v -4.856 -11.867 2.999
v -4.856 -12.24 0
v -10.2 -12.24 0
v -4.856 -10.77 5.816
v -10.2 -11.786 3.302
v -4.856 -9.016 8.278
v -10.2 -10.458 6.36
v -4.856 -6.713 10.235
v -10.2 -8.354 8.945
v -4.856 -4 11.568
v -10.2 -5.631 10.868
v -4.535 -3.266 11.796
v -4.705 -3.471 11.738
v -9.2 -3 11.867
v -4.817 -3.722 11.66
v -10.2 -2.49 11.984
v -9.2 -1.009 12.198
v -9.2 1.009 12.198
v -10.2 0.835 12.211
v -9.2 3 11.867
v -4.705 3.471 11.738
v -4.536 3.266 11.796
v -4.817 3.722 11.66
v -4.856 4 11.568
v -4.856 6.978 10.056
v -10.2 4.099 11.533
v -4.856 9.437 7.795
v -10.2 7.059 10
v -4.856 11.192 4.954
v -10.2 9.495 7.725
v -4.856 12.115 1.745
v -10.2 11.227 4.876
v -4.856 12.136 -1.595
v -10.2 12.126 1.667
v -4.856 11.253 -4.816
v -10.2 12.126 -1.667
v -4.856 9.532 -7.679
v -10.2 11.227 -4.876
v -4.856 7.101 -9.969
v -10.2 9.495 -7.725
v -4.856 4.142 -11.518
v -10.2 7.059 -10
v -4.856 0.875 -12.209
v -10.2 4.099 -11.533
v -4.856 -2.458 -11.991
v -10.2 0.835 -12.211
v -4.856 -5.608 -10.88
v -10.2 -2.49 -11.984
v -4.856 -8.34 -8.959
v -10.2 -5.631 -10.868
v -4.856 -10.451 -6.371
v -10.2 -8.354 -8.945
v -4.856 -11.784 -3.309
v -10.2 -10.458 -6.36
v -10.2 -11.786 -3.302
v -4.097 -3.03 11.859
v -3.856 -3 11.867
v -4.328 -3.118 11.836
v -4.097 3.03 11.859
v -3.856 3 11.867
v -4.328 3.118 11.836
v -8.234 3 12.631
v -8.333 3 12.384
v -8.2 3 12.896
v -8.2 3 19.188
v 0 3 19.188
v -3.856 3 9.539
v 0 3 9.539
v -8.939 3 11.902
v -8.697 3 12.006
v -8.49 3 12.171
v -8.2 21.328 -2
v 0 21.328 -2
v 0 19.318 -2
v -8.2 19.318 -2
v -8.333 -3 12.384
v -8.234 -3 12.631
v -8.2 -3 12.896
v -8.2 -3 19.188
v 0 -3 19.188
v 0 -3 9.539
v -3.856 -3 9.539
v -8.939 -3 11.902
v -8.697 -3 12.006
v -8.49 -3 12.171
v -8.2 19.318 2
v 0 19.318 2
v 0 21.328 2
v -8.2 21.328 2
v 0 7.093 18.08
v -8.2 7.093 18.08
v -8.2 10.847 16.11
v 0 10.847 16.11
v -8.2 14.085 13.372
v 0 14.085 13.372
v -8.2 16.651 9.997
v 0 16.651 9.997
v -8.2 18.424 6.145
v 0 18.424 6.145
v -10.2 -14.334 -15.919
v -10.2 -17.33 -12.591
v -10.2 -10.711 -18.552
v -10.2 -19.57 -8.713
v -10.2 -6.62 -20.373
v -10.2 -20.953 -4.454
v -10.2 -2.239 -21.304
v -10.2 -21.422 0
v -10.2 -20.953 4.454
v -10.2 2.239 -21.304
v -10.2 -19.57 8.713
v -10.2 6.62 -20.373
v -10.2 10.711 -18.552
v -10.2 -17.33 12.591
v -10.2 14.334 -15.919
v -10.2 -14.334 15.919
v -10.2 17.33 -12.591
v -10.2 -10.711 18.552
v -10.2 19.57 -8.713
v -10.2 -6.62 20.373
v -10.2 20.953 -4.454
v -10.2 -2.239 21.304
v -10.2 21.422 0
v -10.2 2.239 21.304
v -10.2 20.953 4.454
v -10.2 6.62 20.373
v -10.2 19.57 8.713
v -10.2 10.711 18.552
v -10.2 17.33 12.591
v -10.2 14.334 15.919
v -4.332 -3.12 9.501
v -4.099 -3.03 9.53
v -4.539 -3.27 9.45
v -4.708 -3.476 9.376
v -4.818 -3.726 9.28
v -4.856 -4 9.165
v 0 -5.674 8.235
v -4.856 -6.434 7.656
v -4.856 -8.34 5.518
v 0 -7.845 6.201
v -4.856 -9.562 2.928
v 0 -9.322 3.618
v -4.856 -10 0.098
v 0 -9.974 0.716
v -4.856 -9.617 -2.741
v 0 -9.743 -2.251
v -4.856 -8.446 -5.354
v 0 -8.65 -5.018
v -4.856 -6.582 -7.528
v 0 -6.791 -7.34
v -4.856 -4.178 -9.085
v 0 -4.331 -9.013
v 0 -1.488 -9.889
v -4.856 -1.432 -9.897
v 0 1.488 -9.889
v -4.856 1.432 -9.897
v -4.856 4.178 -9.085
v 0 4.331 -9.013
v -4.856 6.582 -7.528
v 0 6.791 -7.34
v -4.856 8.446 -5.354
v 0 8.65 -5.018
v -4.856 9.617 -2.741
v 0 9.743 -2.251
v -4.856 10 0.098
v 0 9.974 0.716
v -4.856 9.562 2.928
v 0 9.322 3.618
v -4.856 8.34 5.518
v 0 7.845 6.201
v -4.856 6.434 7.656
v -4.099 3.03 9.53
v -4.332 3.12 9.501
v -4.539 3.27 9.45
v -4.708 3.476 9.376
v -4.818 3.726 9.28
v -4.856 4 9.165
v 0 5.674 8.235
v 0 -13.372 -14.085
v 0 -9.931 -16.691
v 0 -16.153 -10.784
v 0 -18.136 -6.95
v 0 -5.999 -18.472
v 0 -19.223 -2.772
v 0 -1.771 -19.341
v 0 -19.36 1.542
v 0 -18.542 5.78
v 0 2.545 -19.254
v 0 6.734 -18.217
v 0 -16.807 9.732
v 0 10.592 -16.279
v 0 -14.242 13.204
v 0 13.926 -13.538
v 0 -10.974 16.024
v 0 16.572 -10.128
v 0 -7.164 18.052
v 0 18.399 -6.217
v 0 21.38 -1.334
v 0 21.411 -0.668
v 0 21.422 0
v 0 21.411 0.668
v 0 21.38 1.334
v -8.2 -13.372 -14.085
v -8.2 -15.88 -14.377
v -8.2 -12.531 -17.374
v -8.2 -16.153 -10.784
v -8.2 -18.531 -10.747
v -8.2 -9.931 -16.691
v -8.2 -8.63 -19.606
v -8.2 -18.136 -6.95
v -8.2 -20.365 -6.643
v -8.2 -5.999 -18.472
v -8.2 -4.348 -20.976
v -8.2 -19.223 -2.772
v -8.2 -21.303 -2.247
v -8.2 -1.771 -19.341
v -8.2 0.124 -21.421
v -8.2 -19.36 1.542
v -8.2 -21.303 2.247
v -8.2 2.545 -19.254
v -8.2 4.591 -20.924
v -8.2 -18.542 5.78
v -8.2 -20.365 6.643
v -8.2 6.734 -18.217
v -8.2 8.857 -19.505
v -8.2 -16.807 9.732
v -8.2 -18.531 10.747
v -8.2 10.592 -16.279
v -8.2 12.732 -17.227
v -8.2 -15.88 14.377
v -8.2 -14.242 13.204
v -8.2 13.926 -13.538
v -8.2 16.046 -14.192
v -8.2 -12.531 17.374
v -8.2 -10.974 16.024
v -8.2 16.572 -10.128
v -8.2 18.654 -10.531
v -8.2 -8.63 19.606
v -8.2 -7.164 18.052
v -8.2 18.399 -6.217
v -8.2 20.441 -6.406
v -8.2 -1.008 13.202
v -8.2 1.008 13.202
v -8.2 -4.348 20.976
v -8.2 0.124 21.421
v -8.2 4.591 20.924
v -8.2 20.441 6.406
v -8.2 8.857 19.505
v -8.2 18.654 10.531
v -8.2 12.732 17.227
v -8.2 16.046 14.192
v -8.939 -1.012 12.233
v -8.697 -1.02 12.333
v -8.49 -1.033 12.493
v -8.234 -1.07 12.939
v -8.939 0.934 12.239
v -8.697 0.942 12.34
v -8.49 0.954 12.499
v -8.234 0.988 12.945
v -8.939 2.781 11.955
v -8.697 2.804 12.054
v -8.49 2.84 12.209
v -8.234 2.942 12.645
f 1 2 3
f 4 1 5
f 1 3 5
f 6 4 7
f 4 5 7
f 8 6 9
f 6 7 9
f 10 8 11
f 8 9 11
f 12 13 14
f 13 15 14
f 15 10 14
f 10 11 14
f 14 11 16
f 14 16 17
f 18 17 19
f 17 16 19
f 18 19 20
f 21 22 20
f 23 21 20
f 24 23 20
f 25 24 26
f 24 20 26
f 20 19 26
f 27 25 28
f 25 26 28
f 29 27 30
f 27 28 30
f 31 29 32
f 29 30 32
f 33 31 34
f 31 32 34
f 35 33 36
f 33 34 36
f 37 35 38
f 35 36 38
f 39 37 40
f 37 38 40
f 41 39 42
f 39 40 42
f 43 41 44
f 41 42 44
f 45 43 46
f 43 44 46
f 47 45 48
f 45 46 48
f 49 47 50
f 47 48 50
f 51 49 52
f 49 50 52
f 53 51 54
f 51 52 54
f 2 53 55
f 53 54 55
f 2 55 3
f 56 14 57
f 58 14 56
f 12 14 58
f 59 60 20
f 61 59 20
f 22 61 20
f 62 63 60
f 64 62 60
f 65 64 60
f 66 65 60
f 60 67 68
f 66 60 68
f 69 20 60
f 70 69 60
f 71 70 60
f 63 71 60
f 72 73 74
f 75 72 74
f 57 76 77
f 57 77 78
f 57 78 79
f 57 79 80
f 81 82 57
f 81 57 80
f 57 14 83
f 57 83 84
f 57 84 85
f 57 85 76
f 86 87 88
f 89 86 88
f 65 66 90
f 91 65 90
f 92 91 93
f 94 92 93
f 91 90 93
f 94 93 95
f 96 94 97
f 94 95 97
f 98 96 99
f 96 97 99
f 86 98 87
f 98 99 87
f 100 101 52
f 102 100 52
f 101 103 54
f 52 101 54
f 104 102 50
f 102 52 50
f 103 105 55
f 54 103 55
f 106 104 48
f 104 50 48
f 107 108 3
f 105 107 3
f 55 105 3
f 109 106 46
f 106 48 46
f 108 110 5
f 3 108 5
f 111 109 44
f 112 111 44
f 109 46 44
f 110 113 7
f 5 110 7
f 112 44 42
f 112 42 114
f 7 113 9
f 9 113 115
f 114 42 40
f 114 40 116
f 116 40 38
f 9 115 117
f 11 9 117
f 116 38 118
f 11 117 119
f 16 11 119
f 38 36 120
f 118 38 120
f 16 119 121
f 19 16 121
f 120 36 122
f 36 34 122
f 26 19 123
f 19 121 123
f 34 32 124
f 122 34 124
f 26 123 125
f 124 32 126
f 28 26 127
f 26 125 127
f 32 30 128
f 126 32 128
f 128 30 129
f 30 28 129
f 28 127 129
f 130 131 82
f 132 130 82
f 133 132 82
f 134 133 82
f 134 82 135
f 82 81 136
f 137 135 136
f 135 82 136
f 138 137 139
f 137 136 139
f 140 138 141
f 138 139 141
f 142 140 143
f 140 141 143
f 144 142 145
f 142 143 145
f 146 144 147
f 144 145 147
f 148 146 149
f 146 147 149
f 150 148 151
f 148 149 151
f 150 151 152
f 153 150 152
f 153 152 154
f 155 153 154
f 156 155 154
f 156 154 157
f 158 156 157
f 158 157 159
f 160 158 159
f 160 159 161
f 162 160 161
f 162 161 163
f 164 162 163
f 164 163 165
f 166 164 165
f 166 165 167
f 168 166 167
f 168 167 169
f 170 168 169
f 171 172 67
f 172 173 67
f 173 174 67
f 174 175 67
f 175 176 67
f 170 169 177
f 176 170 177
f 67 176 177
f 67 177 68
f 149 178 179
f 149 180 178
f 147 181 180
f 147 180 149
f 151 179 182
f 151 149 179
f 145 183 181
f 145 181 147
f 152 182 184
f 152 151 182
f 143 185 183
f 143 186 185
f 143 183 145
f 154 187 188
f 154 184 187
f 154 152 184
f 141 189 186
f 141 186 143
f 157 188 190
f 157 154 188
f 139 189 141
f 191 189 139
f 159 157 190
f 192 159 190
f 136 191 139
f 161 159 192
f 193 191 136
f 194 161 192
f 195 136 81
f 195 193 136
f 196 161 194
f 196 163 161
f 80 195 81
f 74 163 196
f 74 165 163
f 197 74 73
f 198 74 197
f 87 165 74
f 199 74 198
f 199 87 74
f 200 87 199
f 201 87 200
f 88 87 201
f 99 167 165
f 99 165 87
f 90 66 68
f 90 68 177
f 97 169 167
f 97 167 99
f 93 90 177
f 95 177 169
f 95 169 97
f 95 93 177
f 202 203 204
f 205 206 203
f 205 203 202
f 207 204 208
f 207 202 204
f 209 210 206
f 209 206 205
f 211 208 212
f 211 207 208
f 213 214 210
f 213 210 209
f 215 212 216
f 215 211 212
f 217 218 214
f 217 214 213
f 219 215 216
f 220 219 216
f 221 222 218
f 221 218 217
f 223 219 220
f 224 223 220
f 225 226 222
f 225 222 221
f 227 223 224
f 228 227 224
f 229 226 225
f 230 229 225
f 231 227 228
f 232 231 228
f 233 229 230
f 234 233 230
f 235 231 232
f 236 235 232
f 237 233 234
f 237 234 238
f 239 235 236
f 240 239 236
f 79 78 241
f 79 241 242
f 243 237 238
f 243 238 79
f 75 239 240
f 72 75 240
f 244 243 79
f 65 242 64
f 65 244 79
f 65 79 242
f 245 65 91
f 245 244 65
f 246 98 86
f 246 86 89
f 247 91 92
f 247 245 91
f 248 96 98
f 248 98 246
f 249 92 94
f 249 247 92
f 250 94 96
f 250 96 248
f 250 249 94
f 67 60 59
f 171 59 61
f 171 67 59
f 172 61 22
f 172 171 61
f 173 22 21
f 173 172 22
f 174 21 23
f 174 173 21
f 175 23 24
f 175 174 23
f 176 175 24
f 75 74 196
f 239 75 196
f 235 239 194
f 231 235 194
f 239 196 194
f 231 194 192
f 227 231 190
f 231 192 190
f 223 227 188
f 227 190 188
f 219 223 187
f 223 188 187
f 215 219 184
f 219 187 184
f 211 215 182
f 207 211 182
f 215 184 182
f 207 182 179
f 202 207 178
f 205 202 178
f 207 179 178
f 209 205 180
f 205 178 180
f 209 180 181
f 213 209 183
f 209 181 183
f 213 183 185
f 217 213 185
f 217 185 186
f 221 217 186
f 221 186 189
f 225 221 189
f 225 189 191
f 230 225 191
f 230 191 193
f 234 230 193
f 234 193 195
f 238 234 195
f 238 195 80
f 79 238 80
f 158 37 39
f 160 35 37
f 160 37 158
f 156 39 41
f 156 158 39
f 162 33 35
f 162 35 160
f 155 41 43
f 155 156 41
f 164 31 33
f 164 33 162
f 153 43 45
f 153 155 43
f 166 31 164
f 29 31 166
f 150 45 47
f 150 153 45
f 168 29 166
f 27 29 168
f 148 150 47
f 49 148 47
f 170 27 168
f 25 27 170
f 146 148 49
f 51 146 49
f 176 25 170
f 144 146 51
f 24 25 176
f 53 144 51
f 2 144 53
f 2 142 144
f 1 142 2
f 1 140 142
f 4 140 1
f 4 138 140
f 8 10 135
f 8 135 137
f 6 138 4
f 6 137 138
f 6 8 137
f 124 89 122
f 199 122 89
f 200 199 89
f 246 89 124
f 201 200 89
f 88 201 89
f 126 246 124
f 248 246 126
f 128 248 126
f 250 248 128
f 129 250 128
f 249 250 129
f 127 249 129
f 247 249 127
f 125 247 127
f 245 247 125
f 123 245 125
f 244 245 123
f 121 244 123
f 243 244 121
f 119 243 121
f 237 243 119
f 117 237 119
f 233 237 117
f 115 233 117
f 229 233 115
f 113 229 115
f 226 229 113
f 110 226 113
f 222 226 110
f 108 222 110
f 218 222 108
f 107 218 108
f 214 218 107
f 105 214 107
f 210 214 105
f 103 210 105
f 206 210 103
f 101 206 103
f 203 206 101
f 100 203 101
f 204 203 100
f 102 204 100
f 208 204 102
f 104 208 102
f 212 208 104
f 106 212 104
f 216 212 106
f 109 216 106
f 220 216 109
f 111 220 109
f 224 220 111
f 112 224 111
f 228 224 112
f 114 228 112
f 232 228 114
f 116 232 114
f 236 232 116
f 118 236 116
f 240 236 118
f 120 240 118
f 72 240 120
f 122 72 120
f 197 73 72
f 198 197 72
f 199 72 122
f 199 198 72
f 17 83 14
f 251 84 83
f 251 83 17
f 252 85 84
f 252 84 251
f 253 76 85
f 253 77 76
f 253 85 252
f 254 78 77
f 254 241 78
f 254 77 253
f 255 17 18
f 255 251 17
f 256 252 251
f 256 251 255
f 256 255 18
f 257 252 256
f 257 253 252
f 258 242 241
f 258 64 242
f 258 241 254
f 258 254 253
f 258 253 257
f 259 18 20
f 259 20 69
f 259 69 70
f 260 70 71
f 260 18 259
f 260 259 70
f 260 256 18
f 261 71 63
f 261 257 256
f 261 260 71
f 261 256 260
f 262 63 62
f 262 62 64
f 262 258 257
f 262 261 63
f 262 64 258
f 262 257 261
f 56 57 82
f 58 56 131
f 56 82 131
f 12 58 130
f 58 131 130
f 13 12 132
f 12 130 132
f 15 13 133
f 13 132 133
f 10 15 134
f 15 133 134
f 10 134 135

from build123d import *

# Parameters (mm, degrees)
F0_R      = 21.4215
F1_DEPTH  = 10.2
F3_DEPTH  = 8.2
F4_R      = 12.24
F5_DEPTH  = 5.344
F6_W      = 8.2
F6_H      = 6
F7_DEPTH  = 25
F8_R      = 1
F9_R      = 10
F10_DEPTH = 6


with BuildPart() as f1:
    # F0 (on Right) → F1 (new body)
    with BuildSketch(Plane.YZ):
        Circle(F0_R)
    extrude(amount=-F1_DEPTH)

    # F2 (on face) → F3 (cut)
    with BuildSketch(Plane.YZ):
        with BuildLine():
            ThreePointArc((19.3182468731, -2), (-19.4215, 0), (19.3182468731, 2))
            Line((19.3182468731, 2), (21.3279315043, 2))
            ThreePointArc((21.3279315043, 2), (-21.4215, 0), (21.3279315043, -2))
            Line((21.3279315043, -2), (19.3182468731, -2))
        make_face()
    extrude(amount=-F3_DEPTH, mode=Mode.SUBTRACT)

    # F4 (on face) → F5 (cut)
    with BuildSketch(Plane(origin=(-10.2, 0, 0), x_dir=(0, -1, 0), z_dir=(-1, 0, 0))):
        Circle(F4_R)
    extrude(amount=-F5_DEPTH, mode=Mode.SUBTRACT)

    # F6 (on Top) → F7 (cut)
    with BuildSketch(Plane.XY):
        with Locations((-4.1, 0)):
            Rectangle(F6_W, F6_H)
    extrude(amount=F7_DEPTH, mode=Mode.SUBTRACT)

    # F8
    f8_edges = [f1.edges().sort_by_distance(p)[0] for p in [
        (-4.856, 3, 5.93333),
        (-4.856, -3, 5.93333),
        (-8.2, 0, 12.24),
    ]]
    fillet(f8_edges, radius=F8_R)

    # F9 (on face) → F10 (cut)
    with BuildSketch(Plane.YZ):
        Circle(F9_R)
    extrude(amount=-F10_DEPTH, mode=Mode.SUBTRACT)


solid = f1.part
